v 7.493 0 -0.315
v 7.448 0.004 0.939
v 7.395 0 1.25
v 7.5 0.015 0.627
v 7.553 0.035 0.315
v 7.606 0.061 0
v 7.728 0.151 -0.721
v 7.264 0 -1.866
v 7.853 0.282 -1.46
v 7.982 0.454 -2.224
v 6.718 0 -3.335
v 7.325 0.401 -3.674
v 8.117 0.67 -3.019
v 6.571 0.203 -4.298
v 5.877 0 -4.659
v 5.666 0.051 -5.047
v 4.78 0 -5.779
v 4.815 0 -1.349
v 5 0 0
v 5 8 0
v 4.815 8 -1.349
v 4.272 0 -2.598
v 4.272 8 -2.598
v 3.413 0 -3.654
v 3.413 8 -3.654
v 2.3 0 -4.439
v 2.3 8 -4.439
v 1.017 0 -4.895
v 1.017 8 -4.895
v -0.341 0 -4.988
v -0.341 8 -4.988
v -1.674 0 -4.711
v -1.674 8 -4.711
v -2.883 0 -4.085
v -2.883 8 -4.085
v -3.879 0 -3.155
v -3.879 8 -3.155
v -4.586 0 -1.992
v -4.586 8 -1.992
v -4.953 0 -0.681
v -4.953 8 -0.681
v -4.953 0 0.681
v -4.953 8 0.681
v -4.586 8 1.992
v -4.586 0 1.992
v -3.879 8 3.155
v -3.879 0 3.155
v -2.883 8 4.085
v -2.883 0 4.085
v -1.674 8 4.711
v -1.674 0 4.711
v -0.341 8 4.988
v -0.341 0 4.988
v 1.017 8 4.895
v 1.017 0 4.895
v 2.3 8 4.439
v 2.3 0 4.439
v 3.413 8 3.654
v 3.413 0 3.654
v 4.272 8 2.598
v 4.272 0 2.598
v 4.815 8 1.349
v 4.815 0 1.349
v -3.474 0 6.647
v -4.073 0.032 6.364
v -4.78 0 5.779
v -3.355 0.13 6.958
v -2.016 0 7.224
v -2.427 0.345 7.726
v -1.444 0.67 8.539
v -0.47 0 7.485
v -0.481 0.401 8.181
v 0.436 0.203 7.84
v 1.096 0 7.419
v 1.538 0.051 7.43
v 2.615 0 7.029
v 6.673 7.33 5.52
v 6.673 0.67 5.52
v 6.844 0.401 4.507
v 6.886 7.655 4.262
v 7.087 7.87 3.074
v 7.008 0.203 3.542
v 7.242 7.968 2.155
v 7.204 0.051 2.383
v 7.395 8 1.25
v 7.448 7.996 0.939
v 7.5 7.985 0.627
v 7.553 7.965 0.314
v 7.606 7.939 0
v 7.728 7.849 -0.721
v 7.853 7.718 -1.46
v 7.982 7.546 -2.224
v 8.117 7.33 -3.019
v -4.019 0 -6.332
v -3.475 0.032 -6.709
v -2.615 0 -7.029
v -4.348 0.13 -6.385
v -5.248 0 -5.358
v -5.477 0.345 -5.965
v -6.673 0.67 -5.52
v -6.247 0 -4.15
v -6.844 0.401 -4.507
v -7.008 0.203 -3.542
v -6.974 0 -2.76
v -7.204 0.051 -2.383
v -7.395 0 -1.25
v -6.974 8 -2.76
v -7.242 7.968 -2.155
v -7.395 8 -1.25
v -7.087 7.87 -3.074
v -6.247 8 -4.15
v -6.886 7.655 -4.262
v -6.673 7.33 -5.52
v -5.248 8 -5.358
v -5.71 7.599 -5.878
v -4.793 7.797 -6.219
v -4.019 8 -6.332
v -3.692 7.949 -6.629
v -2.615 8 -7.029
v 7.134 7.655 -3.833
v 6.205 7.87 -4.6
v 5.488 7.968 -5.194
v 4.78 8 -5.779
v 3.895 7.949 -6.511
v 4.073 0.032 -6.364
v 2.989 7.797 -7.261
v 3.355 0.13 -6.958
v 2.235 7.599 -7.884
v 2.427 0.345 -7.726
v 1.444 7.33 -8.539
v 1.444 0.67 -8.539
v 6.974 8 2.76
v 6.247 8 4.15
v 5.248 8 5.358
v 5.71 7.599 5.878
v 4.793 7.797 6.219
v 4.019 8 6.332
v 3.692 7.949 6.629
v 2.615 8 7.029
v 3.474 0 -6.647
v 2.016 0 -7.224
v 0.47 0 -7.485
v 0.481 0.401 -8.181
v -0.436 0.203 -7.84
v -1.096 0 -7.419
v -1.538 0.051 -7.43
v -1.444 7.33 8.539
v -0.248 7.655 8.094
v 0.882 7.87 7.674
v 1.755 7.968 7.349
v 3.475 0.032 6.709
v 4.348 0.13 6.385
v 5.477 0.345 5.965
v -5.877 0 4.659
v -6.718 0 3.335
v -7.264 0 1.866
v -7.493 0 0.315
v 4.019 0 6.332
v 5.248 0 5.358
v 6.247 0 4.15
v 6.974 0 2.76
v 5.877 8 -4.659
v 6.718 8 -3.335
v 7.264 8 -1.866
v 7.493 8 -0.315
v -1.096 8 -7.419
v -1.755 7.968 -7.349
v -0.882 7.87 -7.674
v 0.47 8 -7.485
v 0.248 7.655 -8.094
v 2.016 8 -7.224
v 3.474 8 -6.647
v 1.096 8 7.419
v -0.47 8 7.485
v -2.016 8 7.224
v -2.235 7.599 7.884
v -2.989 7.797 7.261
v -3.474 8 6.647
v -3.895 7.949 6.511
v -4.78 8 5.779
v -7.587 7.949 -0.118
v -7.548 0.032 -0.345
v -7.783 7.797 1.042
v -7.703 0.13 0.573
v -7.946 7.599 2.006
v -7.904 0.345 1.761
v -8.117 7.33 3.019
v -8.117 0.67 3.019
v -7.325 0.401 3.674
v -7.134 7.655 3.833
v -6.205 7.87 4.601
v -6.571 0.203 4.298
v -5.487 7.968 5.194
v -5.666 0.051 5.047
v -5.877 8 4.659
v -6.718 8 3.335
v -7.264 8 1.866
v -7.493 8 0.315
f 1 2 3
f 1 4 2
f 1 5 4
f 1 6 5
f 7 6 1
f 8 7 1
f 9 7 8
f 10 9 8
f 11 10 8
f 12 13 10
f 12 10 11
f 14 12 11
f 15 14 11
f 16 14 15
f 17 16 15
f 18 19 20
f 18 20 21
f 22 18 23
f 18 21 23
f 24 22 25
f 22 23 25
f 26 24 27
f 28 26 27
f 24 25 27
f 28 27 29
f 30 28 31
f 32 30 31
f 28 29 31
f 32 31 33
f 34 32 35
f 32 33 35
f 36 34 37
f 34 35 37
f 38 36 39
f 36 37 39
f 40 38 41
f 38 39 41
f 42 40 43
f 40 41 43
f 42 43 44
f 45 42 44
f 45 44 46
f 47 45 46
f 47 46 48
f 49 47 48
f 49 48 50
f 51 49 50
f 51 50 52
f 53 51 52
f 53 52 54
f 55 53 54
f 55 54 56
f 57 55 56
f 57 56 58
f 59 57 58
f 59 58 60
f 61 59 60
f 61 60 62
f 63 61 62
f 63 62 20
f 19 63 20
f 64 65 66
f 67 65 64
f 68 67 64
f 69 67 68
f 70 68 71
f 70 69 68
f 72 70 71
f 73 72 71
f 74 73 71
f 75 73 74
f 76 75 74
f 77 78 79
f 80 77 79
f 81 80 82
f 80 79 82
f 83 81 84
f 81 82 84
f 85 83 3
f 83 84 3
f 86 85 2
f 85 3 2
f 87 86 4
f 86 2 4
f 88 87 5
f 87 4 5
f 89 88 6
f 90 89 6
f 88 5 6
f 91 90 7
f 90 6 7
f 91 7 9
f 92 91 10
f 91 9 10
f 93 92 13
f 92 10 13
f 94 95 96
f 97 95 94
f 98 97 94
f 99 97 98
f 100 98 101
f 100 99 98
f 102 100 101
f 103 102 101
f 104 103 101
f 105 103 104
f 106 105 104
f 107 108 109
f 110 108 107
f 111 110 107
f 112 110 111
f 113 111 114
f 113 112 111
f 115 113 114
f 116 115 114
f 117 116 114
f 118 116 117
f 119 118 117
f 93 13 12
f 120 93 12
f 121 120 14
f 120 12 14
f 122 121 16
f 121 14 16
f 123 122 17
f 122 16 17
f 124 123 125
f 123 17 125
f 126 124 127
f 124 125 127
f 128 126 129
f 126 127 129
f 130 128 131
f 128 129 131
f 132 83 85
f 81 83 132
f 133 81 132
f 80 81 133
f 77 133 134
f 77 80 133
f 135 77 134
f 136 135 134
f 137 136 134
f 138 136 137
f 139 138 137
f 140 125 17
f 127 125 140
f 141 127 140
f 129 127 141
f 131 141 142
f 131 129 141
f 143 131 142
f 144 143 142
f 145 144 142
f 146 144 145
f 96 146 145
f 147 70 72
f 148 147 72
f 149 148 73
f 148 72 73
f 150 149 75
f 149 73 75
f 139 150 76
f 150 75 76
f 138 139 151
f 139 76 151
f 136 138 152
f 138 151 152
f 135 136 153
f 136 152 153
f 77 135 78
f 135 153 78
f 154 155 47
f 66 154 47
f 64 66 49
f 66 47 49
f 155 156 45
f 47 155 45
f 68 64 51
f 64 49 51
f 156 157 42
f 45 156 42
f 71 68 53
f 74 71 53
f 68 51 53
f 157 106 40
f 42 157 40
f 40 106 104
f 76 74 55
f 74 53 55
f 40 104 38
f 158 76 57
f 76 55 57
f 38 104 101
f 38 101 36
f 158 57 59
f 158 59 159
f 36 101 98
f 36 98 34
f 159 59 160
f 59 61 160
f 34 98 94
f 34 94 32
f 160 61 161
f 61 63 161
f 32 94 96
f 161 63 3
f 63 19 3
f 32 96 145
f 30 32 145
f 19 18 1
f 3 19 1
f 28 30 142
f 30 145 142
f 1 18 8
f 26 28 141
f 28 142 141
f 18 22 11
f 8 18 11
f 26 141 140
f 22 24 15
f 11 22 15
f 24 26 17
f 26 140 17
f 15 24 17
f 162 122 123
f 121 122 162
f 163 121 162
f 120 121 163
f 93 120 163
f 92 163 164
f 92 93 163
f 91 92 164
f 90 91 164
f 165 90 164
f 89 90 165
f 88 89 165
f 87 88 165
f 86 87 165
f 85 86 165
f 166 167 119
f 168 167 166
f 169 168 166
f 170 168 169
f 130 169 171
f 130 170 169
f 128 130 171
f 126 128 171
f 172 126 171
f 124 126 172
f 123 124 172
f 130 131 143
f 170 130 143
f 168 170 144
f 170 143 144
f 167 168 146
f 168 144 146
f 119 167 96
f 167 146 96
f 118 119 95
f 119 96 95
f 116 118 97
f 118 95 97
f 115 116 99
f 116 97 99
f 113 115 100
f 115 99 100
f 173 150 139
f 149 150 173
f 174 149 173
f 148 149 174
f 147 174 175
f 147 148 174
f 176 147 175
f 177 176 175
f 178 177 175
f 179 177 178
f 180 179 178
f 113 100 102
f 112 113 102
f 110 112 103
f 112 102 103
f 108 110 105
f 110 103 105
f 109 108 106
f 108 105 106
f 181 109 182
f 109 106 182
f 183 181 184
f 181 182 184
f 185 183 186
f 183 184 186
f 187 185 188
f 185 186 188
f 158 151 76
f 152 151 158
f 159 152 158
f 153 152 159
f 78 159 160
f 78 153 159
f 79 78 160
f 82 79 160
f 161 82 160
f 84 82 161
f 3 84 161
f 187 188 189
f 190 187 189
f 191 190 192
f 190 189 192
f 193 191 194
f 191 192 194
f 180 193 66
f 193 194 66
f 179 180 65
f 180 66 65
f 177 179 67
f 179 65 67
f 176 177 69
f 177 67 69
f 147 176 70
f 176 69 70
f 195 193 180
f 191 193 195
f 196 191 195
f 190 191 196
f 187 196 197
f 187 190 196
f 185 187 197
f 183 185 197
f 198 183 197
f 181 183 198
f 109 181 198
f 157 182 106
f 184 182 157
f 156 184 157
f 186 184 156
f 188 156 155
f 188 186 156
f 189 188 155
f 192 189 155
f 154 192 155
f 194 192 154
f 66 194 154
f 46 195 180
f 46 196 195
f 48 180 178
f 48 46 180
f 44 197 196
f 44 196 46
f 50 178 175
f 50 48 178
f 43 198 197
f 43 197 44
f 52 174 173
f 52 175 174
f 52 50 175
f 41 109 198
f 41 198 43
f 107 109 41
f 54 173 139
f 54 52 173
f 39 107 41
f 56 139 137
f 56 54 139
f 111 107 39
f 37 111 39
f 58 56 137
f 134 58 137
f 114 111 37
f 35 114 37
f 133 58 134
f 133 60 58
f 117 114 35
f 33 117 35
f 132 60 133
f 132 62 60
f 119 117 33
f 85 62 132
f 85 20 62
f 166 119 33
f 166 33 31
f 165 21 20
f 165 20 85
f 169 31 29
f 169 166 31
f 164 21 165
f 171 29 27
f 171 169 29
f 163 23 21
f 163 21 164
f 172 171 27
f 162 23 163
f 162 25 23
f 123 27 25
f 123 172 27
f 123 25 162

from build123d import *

# Parameters (mm, degrees)
BOSS_EXTRUDE1_DEPTH = 8
SKETCH7_OUTSIDE_W   = 26.674
SKETCH7_OUTSIDE_H   = 27.518
SKETCH7_OUTSIDE_R   = 7.5
CUT_EXTRUDE4_DEPTH  = 1
CUT_EXTRUDE4_TAPER  = 60
SKETCH8_OUTSIDE_W   = 26.674
SKETCH8_OUTSIDE_H   = 27.518
SKETCH8_OUTSIDE_R   = 7.5
CUT_EXTRUDE5_DEPTH  = 1
CUT_EXTRUDE5_TAPER  = 60
SKETCH9_R           = 5
CUT_EXTRUDE6_DEPTH  = 10


with BuildPart() as part:
    # Sketch1 → Boss-Extrude1 (new body)
    with BuildSketch(Plane(origin=(0, 0, 0), x_dir=(1, 0, 0), z_dir=(0, 1, 0))):
        Polygon((6.673205692, -5.519812116), (8.116900362, 3.019259596), (1.44369467, 8.539071712), (-6.673205692, 5.519812116), (-8.116900362, -3.019259596), (-1.44369467, -8.539071712), align=None)
    extrude(amount=BOSS_EXTRUDE1_DEPTH)

    # Sketch7 outside → Cut-Extrude4 (cut)
    with BuildSketch(Plane(origin=(0, 8, 0), x_dir=(1, 0, 0), z_dir=(0, 1, 0))):
        Rectangle(SKETCH7_OUTSIDE_W, SKETCH7_OUTSIDE_H)
        Circle(SKETCH7_OUTSIDE_R, mode=Mode.SUBTRACT)
    extrude(amount=-CUT_EXTRUDE4_DEPTH, taper=CUT_EXTRUDE4_TAPER, mode=Mode.SUBTRACT)

    # Sketch8 outside → Cut-Extrude5 (cut)
    with BuildSketch(Plane.XZ):
        Rectangle(SKETCH8_OUTSIDE_W, SKETCH8_OUTSIDE_H)
        Circle(SKETCH8_OUTSIDE_R, mode=Mode.SUBTRACT)
    extrude(amount=-CUT_EXTRUDE5_DEPTH, taper=CUT_EXTRUDE5_TAPER, mode=Mode.SUBTRACT)

    # Sketch9 → Cut-Extrude6 (cut)
    with BuildSketch(Plane(origin=(0, 8, 0), x_dir=(1, 0, 0), z_dir=(0, 1, 0))):
        Circle(SKETCH9_R)
    extrude(amount=-CUT_EXTRUDE6_DEPTH, mode=Mode.SUBTRACT)


solid = part.part
